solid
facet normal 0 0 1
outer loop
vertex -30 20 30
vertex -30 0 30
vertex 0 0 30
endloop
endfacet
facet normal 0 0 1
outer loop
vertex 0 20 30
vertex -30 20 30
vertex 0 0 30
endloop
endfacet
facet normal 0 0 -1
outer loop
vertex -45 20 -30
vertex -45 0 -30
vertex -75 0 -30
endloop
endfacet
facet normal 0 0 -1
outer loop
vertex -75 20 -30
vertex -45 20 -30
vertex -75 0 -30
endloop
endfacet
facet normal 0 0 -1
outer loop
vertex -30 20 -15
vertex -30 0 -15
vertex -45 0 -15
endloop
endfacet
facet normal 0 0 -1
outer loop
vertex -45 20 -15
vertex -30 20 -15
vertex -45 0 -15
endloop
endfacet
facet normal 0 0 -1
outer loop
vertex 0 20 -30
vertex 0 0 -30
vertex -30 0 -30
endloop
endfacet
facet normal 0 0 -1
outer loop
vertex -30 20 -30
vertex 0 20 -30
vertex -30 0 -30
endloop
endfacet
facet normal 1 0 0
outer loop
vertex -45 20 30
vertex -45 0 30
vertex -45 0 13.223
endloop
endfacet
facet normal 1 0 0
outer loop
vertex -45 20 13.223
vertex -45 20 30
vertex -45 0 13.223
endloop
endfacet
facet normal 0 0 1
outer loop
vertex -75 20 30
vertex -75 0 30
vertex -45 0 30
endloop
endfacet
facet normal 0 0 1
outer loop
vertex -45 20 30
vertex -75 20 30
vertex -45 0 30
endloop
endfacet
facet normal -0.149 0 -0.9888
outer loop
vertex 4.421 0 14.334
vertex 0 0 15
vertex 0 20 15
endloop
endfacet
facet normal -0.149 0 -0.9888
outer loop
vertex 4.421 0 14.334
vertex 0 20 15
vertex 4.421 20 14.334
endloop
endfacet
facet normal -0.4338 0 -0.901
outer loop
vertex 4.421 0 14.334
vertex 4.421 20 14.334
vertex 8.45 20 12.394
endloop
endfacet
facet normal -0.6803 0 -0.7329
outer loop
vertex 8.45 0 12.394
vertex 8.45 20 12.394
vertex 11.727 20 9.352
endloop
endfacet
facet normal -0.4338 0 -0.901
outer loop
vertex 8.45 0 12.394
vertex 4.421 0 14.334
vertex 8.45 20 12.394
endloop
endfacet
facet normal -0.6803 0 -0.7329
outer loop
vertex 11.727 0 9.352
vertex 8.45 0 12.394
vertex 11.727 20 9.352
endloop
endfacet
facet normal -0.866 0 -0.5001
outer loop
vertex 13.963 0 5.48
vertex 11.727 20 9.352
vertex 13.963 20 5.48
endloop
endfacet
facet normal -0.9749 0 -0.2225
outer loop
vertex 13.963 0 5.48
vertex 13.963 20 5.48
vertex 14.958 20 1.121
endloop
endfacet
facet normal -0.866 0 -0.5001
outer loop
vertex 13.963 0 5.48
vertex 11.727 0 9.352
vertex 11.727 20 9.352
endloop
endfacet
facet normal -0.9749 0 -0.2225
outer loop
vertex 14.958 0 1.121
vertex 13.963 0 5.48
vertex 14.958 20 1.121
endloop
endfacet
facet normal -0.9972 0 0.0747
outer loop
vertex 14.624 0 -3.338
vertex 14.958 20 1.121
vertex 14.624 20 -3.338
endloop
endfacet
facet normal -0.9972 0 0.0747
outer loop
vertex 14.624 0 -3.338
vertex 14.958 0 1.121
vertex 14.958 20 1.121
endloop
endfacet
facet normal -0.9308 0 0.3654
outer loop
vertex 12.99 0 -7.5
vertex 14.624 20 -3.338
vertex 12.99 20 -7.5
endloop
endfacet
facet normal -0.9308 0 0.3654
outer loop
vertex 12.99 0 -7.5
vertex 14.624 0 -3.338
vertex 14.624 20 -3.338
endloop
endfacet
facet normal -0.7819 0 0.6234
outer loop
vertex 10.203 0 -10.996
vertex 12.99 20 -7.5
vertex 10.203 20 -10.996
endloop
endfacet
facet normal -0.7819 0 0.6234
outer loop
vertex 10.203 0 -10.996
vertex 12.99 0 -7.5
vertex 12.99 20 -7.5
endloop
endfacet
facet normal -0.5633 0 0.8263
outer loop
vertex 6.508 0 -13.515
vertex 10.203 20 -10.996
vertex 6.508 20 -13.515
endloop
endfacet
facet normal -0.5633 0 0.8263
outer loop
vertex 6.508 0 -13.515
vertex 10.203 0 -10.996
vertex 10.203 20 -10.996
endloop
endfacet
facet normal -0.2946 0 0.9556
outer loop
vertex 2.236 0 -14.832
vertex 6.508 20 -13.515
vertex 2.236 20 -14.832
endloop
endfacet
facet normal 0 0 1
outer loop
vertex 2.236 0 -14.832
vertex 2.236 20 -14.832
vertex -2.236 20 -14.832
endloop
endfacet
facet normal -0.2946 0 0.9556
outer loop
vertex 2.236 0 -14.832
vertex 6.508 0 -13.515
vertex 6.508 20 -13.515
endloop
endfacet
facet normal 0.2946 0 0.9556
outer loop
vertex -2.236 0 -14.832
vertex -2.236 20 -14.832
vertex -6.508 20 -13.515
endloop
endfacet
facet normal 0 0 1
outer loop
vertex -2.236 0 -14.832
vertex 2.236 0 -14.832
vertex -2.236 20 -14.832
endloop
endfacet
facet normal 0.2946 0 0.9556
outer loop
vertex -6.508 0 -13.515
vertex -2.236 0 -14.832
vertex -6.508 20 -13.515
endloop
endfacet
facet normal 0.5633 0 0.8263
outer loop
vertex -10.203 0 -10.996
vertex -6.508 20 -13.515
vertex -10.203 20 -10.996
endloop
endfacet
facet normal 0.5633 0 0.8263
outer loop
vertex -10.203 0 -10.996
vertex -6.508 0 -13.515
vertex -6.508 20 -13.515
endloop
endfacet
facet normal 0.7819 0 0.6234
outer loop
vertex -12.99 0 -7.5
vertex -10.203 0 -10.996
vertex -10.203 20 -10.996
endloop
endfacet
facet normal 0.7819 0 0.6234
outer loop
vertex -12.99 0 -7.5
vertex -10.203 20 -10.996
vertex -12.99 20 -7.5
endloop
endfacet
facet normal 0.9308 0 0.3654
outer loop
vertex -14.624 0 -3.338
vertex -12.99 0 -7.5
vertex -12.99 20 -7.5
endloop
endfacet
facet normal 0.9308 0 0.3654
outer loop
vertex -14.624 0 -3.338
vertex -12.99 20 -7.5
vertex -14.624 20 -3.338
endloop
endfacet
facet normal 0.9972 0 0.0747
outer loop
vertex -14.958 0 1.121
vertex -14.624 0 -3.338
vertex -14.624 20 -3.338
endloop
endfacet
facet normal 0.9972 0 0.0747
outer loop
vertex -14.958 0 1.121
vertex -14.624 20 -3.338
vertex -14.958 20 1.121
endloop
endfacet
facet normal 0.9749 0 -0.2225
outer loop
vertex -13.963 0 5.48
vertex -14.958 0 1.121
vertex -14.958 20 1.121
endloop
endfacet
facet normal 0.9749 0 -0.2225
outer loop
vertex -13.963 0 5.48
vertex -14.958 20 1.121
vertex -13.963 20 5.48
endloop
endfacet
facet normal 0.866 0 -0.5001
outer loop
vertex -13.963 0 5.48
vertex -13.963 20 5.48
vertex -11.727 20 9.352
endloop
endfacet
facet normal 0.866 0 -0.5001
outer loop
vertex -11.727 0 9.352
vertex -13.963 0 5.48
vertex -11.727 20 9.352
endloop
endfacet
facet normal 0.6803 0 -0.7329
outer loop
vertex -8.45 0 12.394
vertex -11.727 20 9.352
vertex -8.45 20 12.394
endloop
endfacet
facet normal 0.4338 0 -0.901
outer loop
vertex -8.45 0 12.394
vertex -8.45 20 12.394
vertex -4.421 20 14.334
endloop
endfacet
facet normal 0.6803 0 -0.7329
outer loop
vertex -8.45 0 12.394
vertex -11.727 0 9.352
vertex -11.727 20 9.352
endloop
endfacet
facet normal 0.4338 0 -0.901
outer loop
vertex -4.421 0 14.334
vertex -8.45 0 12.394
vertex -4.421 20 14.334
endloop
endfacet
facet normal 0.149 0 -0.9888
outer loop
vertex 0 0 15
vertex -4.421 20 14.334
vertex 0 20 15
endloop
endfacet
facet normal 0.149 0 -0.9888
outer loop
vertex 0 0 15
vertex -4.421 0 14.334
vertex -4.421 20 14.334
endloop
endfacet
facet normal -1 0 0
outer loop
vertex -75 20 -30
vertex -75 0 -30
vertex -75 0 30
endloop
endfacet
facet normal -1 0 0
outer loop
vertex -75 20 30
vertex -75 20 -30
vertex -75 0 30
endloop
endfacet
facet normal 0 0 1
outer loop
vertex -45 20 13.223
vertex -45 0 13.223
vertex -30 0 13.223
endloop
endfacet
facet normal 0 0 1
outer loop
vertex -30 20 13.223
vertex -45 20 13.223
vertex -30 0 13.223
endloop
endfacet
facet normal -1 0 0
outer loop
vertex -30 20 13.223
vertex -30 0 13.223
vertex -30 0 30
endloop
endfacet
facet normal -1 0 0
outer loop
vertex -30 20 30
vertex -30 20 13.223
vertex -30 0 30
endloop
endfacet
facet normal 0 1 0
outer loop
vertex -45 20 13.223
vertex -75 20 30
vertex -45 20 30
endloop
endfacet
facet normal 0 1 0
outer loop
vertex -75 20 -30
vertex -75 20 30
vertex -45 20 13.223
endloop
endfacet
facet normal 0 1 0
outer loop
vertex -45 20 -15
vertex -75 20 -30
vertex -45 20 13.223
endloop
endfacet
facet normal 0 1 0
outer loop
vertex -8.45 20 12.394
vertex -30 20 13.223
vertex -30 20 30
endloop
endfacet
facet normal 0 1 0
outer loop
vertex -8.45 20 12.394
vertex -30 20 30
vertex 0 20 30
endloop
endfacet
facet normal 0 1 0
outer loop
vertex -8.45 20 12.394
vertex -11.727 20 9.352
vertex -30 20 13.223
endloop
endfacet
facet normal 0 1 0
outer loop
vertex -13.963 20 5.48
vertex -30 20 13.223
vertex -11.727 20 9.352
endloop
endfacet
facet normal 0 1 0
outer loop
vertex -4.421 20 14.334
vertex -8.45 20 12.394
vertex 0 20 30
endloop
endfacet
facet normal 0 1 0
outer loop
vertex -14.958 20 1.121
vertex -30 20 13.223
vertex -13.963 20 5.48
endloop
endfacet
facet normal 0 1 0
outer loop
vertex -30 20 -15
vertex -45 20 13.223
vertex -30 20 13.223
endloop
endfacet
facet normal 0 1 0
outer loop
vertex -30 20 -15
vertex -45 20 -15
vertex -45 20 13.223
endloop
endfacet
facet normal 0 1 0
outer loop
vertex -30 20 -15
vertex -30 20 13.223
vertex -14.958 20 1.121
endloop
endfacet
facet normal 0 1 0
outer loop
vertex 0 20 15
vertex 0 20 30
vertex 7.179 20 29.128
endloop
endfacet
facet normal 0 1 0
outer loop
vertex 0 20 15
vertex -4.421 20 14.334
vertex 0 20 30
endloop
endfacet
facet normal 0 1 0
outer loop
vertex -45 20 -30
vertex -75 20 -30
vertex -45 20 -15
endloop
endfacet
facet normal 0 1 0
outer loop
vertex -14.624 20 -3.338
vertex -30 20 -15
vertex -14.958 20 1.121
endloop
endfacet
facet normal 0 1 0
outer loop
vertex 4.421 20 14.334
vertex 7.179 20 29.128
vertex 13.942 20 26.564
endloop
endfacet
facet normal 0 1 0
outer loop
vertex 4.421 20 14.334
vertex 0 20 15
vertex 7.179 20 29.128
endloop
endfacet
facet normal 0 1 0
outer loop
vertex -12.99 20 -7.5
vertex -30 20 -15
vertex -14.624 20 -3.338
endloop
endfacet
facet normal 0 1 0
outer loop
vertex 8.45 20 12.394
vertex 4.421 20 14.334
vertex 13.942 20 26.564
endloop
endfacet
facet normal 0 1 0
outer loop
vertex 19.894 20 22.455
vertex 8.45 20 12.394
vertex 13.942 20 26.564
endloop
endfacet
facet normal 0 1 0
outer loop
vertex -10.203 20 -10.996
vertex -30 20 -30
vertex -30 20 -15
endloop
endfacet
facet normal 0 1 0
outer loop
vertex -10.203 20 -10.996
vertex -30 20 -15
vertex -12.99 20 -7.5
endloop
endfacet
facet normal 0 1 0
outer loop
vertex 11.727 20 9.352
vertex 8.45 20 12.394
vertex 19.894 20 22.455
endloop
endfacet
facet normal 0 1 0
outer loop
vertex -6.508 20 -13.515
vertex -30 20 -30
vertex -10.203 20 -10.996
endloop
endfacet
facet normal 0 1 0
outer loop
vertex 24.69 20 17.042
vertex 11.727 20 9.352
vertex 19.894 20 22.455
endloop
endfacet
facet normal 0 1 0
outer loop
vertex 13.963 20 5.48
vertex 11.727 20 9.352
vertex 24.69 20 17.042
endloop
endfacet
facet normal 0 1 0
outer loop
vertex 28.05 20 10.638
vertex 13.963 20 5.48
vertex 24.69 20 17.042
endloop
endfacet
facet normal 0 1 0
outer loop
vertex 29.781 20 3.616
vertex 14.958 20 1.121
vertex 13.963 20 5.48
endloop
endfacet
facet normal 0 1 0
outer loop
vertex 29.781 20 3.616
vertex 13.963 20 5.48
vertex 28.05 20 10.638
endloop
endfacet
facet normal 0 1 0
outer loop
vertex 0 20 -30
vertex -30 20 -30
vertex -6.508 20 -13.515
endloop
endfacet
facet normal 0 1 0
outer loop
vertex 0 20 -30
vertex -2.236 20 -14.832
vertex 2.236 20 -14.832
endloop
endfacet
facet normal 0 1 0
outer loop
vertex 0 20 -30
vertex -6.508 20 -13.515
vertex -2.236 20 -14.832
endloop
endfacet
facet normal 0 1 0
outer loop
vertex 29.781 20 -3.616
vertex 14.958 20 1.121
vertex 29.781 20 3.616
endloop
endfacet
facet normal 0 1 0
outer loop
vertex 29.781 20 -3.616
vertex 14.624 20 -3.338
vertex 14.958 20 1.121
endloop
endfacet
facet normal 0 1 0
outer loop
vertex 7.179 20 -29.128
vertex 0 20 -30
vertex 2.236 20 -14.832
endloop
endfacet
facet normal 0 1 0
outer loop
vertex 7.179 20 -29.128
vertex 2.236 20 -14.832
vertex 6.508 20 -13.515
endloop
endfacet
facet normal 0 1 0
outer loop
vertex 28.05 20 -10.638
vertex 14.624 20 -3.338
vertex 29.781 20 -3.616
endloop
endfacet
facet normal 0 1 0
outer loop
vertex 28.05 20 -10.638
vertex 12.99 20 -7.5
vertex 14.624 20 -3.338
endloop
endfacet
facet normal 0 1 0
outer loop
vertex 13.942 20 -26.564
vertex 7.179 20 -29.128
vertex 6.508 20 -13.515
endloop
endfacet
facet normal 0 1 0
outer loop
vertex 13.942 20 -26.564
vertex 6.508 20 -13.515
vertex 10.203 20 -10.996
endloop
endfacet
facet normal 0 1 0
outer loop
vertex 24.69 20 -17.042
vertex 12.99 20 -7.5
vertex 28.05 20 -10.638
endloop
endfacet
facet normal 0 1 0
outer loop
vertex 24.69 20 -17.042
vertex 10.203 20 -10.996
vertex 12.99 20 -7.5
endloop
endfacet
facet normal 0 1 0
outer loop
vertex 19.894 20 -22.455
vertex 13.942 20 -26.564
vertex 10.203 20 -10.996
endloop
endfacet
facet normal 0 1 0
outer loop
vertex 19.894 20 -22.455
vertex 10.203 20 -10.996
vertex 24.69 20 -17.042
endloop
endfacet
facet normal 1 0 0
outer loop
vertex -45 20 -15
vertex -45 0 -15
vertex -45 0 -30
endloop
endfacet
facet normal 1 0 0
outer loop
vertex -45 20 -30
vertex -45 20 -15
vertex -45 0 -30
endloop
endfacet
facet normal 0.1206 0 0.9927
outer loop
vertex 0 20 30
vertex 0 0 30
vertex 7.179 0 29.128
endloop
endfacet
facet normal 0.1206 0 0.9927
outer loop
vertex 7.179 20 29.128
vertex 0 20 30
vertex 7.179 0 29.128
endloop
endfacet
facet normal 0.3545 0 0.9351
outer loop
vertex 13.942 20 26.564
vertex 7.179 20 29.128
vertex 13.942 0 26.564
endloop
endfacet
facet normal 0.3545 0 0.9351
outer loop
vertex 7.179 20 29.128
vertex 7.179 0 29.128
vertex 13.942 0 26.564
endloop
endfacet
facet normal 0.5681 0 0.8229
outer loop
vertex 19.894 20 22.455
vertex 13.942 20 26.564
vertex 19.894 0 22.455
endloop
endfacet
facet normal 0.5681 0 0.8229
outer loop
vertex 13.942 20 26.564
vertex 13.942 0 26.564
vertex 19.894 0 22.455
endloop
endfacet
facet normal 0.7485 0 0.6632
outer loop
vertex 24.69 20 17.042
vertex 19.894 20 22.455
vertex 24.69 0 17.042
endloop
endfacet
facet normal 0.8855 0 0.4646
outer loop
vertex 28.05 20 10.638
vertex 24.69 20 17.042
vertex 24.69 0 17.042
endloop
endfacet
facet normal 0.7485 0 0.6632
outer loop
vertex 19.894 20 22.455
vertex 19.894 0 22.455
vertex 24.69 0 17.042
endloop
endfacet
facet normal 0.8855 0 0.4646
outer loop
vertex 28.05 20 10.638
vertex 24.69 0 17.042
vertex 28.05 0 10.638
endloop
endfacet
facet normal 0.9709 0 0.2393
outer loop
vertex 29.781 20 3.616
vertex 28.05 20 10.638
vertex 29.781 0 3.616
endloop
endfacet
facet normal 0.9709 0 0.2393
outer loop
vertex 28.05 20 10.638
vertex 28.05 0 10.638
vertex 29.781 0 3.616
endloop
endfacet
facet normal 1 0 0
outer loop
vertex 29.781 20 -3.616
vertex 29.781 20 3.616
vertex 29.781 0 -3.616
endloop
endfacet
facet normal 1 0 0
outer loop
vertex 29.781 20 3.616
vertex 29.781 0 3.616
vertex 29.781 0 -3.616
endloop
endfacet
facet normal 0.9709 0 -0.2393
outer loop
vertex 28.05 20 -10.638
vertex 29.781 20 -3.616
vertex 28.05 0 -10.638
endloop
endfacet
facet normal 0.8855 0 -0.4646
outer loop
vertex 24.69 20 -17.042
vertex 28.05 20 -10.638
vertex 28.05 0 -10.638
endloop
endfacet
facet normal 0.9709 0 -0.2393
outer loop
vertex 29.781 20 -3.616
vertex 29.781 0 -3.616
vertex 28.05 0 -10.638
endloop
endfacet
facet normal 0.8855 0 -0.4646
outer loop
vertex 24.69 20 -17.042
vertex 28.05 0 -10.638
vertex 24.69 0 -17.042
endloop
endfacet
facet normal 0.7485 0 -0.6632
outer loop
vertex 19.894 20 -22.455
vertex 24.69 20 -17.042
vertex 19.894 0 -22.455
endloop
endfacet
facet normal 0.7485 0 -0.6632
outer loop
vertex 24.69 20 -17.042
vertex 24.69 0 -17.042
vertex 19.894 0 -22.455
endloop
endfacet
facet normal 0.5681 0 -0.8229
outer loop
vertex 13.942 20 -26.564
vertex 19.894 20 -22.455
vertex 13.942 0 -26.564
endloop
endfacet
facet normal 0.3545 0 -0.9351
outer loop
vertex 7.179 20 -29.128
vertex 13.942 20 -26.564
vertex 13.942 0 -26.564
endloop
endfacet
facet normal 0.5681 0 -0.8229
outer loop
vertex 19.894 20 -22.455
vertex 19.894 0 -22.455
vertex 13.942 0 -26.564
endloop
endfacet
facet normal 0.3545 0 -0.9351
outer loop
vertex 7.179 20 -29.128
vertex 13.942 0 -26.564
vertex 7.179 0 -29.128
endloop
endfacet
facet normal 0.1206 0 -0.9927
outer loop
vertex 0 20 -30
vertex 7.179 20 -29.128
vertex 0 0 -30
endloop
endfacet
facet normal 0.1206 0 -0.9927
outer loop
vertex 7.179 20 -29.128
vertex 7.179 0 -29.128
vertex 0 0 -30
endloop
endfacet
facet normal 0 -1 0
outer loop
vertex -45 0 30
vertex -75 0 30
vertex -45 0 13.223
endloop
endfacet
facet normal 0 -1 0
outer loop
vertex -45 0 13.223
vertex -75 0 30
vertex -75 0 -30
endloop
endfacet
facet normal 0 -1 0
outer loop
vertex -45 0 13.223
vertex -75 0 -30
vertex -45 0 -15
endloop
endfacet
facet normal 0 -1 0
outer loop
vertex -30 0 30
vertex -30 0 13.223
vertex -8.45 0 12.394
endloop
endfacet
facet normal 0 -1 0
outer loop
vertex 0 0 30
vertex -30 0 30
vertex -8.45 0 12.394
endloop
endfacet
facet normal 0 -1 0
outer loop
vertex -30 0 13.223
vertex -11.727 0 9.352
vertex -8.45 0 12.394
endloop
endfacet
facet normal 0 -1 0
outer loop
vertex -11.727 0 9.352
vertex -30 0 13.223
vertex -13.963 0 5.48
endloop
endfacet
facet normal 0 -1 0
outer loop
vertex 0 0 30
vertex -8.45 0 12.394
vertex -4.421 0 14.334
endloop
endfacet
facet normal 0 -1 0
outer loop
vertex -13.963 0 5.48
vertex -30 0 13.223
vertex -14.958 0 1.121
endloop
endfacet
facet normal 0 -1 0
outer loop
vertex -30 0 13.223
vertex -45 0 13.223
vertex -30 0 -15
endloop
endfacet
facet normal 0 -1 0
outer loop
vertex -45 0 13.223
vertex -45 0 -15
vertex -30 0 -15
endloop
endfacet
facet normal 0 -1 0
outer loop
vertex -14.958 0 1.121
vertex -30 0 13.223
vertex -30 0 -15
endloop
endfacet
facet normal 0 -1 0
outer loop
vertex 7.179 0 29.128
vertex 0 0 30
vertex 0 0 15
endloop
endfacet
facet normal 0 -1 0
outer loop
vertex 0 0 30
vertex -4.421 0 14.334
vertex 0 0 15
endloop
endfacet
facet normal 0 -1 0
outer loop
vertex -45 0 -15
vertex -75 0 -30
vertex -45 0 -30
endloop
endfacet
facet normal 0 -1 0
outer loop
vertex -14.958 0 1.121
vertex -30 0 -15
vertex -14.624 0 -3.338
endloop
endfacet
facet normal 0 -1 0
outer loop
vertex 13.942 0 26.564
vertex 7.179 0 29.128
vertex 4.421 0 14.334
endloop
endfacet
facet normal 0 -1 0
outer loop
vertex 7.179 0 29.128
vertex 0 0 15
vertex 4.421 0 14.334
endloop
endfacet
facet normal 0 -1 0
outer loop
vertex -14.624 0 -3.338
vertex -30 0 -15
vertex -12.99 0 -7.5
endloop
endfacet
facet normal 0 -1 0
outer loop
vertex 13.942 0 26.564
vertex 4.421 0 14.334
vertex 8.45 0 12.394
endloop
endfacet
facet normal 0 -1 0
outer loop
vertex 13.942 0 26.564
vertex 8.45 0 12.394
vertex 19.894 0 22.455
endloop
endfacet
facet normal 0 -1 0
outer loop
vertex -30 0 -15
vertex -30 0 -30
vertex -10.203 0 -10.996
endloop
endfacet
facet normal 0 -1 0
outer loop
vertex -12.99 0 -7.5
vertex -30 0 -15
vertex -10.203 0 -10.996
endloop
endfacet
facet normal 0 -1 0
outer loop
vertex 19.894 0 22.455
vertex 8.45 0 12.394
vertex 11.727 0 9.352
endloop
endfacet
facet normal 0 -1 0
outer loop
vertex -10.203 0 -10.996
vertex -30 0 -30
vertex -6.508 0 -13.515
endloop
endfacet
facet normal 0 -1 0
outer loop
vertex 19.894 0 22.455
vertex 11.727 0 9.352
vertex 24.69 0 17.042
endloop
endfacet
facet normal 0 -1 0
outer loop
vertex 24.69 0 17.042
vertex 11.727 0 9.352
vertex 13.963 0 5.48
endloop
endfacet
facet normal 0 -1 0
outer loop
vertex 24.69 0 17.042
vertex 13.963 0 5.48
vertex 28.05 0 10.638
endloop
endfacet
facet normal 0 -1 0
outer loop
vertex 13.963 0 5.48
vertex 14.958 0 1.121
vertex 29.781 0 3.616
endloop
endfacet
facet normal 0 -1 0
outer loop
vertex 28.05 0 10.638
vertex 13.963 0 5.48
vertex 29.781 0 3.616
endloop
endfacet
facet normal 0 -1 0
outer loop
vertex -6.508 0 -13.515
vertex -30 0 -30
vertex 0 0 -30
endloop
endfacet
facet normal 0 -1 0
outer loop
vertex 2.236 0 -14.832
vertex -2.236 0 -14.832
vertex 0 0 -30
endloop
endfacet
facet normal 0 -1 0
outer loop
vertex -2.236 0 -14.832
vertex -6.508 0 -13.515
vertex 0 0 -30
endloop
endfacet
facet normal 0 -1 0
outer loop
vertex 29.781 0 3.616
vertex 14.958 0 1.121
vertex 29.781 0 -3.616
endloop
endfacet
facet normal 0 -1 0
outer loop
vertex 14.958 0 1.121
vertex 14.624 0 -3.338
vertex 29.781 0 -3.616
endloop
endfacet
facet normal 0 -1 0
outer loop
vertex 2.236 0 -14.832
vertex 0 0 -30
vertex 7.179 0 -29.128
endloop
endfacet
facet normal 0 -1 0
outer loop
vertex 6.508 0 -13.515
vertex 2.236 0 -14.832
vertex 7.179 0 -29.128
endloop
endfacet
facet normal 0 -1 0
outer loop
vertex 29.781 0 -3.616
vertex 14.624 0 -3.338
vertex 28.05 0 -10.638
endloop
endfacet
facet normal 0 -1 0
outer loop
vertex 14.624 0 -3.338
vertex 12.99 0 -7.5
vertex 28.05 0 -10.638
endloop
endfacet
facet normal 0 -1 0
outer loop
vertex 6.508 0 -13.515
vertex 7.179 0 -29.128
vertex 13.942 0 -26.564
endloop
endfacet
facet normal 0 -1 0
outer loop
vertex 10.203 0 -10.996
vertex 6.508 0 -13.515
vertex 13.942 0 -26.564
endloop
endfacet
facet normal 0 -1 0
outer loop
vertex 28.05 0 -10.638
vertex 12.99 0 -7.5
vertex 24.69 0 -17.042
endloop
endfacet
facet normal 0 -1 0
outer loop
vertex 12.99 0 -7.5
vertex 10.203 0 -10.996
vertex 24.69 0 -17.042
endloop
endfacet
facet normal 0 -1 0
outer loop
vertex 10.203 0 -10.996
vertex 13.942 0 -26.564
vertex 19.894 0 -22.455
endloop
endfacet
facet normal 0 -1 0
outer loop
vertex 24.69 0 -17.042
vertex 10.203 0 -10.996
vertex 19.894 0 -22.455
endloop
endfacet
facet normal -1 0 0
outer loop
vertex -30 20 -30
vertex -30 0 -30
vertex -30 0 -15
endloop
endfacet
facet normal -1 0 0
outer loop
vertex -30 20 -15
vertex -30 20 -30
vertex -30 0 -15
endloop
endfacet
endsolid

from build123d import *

# Parameters (mm, degrees)
SKETCH_1_R      = 15
EXTRUDE_1_DEPTH = 20


with BuildPart() as part:
    # 草圖1 → 填料-伸長1 (new body)
    with BuildSketch(Plane(origin=(0, 0, 0), x_dir=(1, 0, 0), z_dir=(0, 1, 0))):
        with BuildLine():
            Line((0, 30), (-30, 30))
            Line((-30, 30), (-30, 15))
            Line((-30, 15), (-45, 15))
            Line((-45, 15), (-45, 30))
            Line((-45, 30), (-75, 30))
            Line((-75, 30), (-75, -30))
            Line((-75, -30), (-45, -30))
            Line((-45, -30), (-45, -13.222878726))
            Line((-45, -13.222878726), (-30, -13.222878726))
            Line((-30, -13.222878726), (-30, -30))
            Line((-30, -30), (0, -30))
            ThreePointArc((0, -30), (30, 0), (0, 30))
        make_face()
        with Locations(Location((0, 0, 0), (0, 0, 270))):
            Circle(SKETCH_1_R, mode=Mode.SUBTRACT)
    extrude(amount=EXTRUDE_1_DEPTH)


solid = part.part
